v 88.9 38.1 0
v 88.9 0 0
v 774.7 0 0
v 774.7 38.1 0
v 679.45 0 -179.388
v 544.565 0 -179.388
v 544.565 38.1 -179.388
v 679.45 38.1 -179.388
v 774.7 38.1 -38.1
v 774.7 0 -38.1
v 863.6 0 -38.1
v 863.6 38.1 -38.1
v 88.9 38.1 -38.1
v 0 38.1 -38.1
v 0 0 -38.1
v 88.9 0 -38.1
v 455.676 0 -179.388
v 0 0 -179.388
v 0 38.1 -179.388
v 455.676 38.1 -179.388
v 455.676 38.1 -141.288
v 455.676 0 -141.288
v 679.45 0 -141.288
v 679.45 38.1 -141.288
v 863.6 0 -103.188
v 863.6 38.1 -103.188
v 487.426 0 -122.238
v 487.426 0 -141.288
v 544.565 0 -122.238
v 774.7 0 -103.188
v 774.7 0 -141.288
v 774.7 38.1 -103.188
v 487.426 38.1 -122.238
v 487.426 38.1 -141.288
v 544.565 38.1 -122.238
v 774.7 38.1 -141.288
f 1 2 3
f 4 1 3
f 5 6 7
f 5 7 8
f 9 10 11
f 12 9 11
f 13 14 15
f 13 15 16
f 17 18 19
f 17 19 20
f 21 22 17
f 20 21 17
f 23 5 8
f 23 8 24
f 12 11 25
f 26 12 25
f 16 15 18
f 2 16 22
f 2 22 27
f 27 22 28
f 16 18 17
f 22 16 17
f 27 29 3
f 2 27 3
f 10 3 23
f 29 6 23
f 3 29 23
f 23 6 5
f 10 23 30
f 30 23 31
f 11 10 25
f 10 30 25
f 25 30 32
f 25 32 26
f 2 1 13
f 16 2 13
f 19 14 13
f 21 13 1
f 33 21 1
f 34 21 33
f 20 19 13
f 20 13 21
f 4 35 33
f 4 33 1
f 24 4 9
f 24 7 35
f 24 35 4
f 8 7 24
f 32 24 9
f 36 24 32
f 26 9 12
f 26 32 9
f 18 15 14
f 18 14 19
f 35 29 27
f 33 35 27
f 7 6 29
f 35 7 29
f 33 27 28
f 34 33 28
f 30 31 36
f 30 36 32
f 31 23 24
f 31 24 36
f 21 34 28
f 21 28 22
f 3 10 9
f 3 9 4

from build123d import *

# Parameters (mm, degrees)
SKETCH1_W           = 863.6
SKETCH1_H           = 179.3875
BOSS_EXTRUDE1_DEPTH = 38.1
SKETCH2_W           = 88.9
SKETCH2_H           = 38.1
CUT_EXTRUDE4_DEPTH  = 39.1
SKETCH3_W           = 184.15
SKETCH3_H           = 38.1
CUT_EXTRUDE1_DEPTH  = 39.1
CUT_EXTRUDE2_DEPTH  = 39.1
SKETCH5_W           = 88.9
SKETCH5_H           = 38.1
CUT_EXTRUDE3_DEPTH  = 39.1
SKETCH6_W           = 88.9
SKETCH6_H           = 38.1
CUT_EXTRUDE5_DEPTH  = 39.1


with BuildPart() as part:
    # Sketch1 → Boss-Extrude1 (new body)
    with BuildSketch(Plane(origin=(0, 0, 0), x_dir=(1, 0, 0), z_dir=(0, 1, 0))):
        with Locations((431.8, 89.69375)):
            Rectangle(SKETCH1_W, SKETCH1_H)
    extrude(amount=BOSS_EXTRUDE1_DEPTH)

    # Sketch2 → Cut-Extrude4 (cut, through all)
    with BuildSketch(Plane.XZ):
        with Locations((819.15, -19.05)):
            Rectangle(SKETCH2_W, SKETCH2_H)
    extrude(amount=-CUT_EXTRUDE4_DEPTH, mode=Mode.SUBTRACT)

    # Sketch3 → Cut-Extrude1 (cut, through all)
    with BuildSketch(Plane.XZ):
        with Locations((771.525, -160.3375)):
            Rectangle(SKETCH3_W, SKETCH3_H)
    extrude(amount=-CUT_EXTRUDE1_DEPTH, mode=Mode.SUBTRACT)

    # Sketch4 → Cut-Extrude2 (cut, through all)
    with BuildSketch(Plane.XZ):
        Polygon((544.56454079, -179.3875), (544.56454079, -122.2375), (487.426, -122.2375), (487.426, -141.2875), (455.676, -141.2875), (455.676, -179.3875), align=None)
    extrude(amount=-CUT_EXTRUDE2_DEPTH, mode=Mode.SUBTRACT)

    # Sketch5 → Cut-Extrude3 (cut, through all)
    with BuildSketch(Plane.XZ):
        with Locations((819.15, -122.2375)):
            Rectangle(SKETCH5_W, SKETCH5_H)
    extrude(amount=-CUT_EXTRUDE3_DEPTH, mode=Mode.SUBTRACT)

    # Sketch6 → Cut-Extrude5 (cut, through all)
    with BuildSketch(Plane(origin=(0, 38.1, 0), x_dir=(1, 0, 0), z_dir=(0, 1, 0))):
        with Locations((44.45, 19.05)):
            Rectangle(SKETCH6_W, SKETCH6_H)
    extrude(amount=-CUT_EXTRUDE5_DEPTH, mode=Mode.SUBTRACT)


solid = part.part
